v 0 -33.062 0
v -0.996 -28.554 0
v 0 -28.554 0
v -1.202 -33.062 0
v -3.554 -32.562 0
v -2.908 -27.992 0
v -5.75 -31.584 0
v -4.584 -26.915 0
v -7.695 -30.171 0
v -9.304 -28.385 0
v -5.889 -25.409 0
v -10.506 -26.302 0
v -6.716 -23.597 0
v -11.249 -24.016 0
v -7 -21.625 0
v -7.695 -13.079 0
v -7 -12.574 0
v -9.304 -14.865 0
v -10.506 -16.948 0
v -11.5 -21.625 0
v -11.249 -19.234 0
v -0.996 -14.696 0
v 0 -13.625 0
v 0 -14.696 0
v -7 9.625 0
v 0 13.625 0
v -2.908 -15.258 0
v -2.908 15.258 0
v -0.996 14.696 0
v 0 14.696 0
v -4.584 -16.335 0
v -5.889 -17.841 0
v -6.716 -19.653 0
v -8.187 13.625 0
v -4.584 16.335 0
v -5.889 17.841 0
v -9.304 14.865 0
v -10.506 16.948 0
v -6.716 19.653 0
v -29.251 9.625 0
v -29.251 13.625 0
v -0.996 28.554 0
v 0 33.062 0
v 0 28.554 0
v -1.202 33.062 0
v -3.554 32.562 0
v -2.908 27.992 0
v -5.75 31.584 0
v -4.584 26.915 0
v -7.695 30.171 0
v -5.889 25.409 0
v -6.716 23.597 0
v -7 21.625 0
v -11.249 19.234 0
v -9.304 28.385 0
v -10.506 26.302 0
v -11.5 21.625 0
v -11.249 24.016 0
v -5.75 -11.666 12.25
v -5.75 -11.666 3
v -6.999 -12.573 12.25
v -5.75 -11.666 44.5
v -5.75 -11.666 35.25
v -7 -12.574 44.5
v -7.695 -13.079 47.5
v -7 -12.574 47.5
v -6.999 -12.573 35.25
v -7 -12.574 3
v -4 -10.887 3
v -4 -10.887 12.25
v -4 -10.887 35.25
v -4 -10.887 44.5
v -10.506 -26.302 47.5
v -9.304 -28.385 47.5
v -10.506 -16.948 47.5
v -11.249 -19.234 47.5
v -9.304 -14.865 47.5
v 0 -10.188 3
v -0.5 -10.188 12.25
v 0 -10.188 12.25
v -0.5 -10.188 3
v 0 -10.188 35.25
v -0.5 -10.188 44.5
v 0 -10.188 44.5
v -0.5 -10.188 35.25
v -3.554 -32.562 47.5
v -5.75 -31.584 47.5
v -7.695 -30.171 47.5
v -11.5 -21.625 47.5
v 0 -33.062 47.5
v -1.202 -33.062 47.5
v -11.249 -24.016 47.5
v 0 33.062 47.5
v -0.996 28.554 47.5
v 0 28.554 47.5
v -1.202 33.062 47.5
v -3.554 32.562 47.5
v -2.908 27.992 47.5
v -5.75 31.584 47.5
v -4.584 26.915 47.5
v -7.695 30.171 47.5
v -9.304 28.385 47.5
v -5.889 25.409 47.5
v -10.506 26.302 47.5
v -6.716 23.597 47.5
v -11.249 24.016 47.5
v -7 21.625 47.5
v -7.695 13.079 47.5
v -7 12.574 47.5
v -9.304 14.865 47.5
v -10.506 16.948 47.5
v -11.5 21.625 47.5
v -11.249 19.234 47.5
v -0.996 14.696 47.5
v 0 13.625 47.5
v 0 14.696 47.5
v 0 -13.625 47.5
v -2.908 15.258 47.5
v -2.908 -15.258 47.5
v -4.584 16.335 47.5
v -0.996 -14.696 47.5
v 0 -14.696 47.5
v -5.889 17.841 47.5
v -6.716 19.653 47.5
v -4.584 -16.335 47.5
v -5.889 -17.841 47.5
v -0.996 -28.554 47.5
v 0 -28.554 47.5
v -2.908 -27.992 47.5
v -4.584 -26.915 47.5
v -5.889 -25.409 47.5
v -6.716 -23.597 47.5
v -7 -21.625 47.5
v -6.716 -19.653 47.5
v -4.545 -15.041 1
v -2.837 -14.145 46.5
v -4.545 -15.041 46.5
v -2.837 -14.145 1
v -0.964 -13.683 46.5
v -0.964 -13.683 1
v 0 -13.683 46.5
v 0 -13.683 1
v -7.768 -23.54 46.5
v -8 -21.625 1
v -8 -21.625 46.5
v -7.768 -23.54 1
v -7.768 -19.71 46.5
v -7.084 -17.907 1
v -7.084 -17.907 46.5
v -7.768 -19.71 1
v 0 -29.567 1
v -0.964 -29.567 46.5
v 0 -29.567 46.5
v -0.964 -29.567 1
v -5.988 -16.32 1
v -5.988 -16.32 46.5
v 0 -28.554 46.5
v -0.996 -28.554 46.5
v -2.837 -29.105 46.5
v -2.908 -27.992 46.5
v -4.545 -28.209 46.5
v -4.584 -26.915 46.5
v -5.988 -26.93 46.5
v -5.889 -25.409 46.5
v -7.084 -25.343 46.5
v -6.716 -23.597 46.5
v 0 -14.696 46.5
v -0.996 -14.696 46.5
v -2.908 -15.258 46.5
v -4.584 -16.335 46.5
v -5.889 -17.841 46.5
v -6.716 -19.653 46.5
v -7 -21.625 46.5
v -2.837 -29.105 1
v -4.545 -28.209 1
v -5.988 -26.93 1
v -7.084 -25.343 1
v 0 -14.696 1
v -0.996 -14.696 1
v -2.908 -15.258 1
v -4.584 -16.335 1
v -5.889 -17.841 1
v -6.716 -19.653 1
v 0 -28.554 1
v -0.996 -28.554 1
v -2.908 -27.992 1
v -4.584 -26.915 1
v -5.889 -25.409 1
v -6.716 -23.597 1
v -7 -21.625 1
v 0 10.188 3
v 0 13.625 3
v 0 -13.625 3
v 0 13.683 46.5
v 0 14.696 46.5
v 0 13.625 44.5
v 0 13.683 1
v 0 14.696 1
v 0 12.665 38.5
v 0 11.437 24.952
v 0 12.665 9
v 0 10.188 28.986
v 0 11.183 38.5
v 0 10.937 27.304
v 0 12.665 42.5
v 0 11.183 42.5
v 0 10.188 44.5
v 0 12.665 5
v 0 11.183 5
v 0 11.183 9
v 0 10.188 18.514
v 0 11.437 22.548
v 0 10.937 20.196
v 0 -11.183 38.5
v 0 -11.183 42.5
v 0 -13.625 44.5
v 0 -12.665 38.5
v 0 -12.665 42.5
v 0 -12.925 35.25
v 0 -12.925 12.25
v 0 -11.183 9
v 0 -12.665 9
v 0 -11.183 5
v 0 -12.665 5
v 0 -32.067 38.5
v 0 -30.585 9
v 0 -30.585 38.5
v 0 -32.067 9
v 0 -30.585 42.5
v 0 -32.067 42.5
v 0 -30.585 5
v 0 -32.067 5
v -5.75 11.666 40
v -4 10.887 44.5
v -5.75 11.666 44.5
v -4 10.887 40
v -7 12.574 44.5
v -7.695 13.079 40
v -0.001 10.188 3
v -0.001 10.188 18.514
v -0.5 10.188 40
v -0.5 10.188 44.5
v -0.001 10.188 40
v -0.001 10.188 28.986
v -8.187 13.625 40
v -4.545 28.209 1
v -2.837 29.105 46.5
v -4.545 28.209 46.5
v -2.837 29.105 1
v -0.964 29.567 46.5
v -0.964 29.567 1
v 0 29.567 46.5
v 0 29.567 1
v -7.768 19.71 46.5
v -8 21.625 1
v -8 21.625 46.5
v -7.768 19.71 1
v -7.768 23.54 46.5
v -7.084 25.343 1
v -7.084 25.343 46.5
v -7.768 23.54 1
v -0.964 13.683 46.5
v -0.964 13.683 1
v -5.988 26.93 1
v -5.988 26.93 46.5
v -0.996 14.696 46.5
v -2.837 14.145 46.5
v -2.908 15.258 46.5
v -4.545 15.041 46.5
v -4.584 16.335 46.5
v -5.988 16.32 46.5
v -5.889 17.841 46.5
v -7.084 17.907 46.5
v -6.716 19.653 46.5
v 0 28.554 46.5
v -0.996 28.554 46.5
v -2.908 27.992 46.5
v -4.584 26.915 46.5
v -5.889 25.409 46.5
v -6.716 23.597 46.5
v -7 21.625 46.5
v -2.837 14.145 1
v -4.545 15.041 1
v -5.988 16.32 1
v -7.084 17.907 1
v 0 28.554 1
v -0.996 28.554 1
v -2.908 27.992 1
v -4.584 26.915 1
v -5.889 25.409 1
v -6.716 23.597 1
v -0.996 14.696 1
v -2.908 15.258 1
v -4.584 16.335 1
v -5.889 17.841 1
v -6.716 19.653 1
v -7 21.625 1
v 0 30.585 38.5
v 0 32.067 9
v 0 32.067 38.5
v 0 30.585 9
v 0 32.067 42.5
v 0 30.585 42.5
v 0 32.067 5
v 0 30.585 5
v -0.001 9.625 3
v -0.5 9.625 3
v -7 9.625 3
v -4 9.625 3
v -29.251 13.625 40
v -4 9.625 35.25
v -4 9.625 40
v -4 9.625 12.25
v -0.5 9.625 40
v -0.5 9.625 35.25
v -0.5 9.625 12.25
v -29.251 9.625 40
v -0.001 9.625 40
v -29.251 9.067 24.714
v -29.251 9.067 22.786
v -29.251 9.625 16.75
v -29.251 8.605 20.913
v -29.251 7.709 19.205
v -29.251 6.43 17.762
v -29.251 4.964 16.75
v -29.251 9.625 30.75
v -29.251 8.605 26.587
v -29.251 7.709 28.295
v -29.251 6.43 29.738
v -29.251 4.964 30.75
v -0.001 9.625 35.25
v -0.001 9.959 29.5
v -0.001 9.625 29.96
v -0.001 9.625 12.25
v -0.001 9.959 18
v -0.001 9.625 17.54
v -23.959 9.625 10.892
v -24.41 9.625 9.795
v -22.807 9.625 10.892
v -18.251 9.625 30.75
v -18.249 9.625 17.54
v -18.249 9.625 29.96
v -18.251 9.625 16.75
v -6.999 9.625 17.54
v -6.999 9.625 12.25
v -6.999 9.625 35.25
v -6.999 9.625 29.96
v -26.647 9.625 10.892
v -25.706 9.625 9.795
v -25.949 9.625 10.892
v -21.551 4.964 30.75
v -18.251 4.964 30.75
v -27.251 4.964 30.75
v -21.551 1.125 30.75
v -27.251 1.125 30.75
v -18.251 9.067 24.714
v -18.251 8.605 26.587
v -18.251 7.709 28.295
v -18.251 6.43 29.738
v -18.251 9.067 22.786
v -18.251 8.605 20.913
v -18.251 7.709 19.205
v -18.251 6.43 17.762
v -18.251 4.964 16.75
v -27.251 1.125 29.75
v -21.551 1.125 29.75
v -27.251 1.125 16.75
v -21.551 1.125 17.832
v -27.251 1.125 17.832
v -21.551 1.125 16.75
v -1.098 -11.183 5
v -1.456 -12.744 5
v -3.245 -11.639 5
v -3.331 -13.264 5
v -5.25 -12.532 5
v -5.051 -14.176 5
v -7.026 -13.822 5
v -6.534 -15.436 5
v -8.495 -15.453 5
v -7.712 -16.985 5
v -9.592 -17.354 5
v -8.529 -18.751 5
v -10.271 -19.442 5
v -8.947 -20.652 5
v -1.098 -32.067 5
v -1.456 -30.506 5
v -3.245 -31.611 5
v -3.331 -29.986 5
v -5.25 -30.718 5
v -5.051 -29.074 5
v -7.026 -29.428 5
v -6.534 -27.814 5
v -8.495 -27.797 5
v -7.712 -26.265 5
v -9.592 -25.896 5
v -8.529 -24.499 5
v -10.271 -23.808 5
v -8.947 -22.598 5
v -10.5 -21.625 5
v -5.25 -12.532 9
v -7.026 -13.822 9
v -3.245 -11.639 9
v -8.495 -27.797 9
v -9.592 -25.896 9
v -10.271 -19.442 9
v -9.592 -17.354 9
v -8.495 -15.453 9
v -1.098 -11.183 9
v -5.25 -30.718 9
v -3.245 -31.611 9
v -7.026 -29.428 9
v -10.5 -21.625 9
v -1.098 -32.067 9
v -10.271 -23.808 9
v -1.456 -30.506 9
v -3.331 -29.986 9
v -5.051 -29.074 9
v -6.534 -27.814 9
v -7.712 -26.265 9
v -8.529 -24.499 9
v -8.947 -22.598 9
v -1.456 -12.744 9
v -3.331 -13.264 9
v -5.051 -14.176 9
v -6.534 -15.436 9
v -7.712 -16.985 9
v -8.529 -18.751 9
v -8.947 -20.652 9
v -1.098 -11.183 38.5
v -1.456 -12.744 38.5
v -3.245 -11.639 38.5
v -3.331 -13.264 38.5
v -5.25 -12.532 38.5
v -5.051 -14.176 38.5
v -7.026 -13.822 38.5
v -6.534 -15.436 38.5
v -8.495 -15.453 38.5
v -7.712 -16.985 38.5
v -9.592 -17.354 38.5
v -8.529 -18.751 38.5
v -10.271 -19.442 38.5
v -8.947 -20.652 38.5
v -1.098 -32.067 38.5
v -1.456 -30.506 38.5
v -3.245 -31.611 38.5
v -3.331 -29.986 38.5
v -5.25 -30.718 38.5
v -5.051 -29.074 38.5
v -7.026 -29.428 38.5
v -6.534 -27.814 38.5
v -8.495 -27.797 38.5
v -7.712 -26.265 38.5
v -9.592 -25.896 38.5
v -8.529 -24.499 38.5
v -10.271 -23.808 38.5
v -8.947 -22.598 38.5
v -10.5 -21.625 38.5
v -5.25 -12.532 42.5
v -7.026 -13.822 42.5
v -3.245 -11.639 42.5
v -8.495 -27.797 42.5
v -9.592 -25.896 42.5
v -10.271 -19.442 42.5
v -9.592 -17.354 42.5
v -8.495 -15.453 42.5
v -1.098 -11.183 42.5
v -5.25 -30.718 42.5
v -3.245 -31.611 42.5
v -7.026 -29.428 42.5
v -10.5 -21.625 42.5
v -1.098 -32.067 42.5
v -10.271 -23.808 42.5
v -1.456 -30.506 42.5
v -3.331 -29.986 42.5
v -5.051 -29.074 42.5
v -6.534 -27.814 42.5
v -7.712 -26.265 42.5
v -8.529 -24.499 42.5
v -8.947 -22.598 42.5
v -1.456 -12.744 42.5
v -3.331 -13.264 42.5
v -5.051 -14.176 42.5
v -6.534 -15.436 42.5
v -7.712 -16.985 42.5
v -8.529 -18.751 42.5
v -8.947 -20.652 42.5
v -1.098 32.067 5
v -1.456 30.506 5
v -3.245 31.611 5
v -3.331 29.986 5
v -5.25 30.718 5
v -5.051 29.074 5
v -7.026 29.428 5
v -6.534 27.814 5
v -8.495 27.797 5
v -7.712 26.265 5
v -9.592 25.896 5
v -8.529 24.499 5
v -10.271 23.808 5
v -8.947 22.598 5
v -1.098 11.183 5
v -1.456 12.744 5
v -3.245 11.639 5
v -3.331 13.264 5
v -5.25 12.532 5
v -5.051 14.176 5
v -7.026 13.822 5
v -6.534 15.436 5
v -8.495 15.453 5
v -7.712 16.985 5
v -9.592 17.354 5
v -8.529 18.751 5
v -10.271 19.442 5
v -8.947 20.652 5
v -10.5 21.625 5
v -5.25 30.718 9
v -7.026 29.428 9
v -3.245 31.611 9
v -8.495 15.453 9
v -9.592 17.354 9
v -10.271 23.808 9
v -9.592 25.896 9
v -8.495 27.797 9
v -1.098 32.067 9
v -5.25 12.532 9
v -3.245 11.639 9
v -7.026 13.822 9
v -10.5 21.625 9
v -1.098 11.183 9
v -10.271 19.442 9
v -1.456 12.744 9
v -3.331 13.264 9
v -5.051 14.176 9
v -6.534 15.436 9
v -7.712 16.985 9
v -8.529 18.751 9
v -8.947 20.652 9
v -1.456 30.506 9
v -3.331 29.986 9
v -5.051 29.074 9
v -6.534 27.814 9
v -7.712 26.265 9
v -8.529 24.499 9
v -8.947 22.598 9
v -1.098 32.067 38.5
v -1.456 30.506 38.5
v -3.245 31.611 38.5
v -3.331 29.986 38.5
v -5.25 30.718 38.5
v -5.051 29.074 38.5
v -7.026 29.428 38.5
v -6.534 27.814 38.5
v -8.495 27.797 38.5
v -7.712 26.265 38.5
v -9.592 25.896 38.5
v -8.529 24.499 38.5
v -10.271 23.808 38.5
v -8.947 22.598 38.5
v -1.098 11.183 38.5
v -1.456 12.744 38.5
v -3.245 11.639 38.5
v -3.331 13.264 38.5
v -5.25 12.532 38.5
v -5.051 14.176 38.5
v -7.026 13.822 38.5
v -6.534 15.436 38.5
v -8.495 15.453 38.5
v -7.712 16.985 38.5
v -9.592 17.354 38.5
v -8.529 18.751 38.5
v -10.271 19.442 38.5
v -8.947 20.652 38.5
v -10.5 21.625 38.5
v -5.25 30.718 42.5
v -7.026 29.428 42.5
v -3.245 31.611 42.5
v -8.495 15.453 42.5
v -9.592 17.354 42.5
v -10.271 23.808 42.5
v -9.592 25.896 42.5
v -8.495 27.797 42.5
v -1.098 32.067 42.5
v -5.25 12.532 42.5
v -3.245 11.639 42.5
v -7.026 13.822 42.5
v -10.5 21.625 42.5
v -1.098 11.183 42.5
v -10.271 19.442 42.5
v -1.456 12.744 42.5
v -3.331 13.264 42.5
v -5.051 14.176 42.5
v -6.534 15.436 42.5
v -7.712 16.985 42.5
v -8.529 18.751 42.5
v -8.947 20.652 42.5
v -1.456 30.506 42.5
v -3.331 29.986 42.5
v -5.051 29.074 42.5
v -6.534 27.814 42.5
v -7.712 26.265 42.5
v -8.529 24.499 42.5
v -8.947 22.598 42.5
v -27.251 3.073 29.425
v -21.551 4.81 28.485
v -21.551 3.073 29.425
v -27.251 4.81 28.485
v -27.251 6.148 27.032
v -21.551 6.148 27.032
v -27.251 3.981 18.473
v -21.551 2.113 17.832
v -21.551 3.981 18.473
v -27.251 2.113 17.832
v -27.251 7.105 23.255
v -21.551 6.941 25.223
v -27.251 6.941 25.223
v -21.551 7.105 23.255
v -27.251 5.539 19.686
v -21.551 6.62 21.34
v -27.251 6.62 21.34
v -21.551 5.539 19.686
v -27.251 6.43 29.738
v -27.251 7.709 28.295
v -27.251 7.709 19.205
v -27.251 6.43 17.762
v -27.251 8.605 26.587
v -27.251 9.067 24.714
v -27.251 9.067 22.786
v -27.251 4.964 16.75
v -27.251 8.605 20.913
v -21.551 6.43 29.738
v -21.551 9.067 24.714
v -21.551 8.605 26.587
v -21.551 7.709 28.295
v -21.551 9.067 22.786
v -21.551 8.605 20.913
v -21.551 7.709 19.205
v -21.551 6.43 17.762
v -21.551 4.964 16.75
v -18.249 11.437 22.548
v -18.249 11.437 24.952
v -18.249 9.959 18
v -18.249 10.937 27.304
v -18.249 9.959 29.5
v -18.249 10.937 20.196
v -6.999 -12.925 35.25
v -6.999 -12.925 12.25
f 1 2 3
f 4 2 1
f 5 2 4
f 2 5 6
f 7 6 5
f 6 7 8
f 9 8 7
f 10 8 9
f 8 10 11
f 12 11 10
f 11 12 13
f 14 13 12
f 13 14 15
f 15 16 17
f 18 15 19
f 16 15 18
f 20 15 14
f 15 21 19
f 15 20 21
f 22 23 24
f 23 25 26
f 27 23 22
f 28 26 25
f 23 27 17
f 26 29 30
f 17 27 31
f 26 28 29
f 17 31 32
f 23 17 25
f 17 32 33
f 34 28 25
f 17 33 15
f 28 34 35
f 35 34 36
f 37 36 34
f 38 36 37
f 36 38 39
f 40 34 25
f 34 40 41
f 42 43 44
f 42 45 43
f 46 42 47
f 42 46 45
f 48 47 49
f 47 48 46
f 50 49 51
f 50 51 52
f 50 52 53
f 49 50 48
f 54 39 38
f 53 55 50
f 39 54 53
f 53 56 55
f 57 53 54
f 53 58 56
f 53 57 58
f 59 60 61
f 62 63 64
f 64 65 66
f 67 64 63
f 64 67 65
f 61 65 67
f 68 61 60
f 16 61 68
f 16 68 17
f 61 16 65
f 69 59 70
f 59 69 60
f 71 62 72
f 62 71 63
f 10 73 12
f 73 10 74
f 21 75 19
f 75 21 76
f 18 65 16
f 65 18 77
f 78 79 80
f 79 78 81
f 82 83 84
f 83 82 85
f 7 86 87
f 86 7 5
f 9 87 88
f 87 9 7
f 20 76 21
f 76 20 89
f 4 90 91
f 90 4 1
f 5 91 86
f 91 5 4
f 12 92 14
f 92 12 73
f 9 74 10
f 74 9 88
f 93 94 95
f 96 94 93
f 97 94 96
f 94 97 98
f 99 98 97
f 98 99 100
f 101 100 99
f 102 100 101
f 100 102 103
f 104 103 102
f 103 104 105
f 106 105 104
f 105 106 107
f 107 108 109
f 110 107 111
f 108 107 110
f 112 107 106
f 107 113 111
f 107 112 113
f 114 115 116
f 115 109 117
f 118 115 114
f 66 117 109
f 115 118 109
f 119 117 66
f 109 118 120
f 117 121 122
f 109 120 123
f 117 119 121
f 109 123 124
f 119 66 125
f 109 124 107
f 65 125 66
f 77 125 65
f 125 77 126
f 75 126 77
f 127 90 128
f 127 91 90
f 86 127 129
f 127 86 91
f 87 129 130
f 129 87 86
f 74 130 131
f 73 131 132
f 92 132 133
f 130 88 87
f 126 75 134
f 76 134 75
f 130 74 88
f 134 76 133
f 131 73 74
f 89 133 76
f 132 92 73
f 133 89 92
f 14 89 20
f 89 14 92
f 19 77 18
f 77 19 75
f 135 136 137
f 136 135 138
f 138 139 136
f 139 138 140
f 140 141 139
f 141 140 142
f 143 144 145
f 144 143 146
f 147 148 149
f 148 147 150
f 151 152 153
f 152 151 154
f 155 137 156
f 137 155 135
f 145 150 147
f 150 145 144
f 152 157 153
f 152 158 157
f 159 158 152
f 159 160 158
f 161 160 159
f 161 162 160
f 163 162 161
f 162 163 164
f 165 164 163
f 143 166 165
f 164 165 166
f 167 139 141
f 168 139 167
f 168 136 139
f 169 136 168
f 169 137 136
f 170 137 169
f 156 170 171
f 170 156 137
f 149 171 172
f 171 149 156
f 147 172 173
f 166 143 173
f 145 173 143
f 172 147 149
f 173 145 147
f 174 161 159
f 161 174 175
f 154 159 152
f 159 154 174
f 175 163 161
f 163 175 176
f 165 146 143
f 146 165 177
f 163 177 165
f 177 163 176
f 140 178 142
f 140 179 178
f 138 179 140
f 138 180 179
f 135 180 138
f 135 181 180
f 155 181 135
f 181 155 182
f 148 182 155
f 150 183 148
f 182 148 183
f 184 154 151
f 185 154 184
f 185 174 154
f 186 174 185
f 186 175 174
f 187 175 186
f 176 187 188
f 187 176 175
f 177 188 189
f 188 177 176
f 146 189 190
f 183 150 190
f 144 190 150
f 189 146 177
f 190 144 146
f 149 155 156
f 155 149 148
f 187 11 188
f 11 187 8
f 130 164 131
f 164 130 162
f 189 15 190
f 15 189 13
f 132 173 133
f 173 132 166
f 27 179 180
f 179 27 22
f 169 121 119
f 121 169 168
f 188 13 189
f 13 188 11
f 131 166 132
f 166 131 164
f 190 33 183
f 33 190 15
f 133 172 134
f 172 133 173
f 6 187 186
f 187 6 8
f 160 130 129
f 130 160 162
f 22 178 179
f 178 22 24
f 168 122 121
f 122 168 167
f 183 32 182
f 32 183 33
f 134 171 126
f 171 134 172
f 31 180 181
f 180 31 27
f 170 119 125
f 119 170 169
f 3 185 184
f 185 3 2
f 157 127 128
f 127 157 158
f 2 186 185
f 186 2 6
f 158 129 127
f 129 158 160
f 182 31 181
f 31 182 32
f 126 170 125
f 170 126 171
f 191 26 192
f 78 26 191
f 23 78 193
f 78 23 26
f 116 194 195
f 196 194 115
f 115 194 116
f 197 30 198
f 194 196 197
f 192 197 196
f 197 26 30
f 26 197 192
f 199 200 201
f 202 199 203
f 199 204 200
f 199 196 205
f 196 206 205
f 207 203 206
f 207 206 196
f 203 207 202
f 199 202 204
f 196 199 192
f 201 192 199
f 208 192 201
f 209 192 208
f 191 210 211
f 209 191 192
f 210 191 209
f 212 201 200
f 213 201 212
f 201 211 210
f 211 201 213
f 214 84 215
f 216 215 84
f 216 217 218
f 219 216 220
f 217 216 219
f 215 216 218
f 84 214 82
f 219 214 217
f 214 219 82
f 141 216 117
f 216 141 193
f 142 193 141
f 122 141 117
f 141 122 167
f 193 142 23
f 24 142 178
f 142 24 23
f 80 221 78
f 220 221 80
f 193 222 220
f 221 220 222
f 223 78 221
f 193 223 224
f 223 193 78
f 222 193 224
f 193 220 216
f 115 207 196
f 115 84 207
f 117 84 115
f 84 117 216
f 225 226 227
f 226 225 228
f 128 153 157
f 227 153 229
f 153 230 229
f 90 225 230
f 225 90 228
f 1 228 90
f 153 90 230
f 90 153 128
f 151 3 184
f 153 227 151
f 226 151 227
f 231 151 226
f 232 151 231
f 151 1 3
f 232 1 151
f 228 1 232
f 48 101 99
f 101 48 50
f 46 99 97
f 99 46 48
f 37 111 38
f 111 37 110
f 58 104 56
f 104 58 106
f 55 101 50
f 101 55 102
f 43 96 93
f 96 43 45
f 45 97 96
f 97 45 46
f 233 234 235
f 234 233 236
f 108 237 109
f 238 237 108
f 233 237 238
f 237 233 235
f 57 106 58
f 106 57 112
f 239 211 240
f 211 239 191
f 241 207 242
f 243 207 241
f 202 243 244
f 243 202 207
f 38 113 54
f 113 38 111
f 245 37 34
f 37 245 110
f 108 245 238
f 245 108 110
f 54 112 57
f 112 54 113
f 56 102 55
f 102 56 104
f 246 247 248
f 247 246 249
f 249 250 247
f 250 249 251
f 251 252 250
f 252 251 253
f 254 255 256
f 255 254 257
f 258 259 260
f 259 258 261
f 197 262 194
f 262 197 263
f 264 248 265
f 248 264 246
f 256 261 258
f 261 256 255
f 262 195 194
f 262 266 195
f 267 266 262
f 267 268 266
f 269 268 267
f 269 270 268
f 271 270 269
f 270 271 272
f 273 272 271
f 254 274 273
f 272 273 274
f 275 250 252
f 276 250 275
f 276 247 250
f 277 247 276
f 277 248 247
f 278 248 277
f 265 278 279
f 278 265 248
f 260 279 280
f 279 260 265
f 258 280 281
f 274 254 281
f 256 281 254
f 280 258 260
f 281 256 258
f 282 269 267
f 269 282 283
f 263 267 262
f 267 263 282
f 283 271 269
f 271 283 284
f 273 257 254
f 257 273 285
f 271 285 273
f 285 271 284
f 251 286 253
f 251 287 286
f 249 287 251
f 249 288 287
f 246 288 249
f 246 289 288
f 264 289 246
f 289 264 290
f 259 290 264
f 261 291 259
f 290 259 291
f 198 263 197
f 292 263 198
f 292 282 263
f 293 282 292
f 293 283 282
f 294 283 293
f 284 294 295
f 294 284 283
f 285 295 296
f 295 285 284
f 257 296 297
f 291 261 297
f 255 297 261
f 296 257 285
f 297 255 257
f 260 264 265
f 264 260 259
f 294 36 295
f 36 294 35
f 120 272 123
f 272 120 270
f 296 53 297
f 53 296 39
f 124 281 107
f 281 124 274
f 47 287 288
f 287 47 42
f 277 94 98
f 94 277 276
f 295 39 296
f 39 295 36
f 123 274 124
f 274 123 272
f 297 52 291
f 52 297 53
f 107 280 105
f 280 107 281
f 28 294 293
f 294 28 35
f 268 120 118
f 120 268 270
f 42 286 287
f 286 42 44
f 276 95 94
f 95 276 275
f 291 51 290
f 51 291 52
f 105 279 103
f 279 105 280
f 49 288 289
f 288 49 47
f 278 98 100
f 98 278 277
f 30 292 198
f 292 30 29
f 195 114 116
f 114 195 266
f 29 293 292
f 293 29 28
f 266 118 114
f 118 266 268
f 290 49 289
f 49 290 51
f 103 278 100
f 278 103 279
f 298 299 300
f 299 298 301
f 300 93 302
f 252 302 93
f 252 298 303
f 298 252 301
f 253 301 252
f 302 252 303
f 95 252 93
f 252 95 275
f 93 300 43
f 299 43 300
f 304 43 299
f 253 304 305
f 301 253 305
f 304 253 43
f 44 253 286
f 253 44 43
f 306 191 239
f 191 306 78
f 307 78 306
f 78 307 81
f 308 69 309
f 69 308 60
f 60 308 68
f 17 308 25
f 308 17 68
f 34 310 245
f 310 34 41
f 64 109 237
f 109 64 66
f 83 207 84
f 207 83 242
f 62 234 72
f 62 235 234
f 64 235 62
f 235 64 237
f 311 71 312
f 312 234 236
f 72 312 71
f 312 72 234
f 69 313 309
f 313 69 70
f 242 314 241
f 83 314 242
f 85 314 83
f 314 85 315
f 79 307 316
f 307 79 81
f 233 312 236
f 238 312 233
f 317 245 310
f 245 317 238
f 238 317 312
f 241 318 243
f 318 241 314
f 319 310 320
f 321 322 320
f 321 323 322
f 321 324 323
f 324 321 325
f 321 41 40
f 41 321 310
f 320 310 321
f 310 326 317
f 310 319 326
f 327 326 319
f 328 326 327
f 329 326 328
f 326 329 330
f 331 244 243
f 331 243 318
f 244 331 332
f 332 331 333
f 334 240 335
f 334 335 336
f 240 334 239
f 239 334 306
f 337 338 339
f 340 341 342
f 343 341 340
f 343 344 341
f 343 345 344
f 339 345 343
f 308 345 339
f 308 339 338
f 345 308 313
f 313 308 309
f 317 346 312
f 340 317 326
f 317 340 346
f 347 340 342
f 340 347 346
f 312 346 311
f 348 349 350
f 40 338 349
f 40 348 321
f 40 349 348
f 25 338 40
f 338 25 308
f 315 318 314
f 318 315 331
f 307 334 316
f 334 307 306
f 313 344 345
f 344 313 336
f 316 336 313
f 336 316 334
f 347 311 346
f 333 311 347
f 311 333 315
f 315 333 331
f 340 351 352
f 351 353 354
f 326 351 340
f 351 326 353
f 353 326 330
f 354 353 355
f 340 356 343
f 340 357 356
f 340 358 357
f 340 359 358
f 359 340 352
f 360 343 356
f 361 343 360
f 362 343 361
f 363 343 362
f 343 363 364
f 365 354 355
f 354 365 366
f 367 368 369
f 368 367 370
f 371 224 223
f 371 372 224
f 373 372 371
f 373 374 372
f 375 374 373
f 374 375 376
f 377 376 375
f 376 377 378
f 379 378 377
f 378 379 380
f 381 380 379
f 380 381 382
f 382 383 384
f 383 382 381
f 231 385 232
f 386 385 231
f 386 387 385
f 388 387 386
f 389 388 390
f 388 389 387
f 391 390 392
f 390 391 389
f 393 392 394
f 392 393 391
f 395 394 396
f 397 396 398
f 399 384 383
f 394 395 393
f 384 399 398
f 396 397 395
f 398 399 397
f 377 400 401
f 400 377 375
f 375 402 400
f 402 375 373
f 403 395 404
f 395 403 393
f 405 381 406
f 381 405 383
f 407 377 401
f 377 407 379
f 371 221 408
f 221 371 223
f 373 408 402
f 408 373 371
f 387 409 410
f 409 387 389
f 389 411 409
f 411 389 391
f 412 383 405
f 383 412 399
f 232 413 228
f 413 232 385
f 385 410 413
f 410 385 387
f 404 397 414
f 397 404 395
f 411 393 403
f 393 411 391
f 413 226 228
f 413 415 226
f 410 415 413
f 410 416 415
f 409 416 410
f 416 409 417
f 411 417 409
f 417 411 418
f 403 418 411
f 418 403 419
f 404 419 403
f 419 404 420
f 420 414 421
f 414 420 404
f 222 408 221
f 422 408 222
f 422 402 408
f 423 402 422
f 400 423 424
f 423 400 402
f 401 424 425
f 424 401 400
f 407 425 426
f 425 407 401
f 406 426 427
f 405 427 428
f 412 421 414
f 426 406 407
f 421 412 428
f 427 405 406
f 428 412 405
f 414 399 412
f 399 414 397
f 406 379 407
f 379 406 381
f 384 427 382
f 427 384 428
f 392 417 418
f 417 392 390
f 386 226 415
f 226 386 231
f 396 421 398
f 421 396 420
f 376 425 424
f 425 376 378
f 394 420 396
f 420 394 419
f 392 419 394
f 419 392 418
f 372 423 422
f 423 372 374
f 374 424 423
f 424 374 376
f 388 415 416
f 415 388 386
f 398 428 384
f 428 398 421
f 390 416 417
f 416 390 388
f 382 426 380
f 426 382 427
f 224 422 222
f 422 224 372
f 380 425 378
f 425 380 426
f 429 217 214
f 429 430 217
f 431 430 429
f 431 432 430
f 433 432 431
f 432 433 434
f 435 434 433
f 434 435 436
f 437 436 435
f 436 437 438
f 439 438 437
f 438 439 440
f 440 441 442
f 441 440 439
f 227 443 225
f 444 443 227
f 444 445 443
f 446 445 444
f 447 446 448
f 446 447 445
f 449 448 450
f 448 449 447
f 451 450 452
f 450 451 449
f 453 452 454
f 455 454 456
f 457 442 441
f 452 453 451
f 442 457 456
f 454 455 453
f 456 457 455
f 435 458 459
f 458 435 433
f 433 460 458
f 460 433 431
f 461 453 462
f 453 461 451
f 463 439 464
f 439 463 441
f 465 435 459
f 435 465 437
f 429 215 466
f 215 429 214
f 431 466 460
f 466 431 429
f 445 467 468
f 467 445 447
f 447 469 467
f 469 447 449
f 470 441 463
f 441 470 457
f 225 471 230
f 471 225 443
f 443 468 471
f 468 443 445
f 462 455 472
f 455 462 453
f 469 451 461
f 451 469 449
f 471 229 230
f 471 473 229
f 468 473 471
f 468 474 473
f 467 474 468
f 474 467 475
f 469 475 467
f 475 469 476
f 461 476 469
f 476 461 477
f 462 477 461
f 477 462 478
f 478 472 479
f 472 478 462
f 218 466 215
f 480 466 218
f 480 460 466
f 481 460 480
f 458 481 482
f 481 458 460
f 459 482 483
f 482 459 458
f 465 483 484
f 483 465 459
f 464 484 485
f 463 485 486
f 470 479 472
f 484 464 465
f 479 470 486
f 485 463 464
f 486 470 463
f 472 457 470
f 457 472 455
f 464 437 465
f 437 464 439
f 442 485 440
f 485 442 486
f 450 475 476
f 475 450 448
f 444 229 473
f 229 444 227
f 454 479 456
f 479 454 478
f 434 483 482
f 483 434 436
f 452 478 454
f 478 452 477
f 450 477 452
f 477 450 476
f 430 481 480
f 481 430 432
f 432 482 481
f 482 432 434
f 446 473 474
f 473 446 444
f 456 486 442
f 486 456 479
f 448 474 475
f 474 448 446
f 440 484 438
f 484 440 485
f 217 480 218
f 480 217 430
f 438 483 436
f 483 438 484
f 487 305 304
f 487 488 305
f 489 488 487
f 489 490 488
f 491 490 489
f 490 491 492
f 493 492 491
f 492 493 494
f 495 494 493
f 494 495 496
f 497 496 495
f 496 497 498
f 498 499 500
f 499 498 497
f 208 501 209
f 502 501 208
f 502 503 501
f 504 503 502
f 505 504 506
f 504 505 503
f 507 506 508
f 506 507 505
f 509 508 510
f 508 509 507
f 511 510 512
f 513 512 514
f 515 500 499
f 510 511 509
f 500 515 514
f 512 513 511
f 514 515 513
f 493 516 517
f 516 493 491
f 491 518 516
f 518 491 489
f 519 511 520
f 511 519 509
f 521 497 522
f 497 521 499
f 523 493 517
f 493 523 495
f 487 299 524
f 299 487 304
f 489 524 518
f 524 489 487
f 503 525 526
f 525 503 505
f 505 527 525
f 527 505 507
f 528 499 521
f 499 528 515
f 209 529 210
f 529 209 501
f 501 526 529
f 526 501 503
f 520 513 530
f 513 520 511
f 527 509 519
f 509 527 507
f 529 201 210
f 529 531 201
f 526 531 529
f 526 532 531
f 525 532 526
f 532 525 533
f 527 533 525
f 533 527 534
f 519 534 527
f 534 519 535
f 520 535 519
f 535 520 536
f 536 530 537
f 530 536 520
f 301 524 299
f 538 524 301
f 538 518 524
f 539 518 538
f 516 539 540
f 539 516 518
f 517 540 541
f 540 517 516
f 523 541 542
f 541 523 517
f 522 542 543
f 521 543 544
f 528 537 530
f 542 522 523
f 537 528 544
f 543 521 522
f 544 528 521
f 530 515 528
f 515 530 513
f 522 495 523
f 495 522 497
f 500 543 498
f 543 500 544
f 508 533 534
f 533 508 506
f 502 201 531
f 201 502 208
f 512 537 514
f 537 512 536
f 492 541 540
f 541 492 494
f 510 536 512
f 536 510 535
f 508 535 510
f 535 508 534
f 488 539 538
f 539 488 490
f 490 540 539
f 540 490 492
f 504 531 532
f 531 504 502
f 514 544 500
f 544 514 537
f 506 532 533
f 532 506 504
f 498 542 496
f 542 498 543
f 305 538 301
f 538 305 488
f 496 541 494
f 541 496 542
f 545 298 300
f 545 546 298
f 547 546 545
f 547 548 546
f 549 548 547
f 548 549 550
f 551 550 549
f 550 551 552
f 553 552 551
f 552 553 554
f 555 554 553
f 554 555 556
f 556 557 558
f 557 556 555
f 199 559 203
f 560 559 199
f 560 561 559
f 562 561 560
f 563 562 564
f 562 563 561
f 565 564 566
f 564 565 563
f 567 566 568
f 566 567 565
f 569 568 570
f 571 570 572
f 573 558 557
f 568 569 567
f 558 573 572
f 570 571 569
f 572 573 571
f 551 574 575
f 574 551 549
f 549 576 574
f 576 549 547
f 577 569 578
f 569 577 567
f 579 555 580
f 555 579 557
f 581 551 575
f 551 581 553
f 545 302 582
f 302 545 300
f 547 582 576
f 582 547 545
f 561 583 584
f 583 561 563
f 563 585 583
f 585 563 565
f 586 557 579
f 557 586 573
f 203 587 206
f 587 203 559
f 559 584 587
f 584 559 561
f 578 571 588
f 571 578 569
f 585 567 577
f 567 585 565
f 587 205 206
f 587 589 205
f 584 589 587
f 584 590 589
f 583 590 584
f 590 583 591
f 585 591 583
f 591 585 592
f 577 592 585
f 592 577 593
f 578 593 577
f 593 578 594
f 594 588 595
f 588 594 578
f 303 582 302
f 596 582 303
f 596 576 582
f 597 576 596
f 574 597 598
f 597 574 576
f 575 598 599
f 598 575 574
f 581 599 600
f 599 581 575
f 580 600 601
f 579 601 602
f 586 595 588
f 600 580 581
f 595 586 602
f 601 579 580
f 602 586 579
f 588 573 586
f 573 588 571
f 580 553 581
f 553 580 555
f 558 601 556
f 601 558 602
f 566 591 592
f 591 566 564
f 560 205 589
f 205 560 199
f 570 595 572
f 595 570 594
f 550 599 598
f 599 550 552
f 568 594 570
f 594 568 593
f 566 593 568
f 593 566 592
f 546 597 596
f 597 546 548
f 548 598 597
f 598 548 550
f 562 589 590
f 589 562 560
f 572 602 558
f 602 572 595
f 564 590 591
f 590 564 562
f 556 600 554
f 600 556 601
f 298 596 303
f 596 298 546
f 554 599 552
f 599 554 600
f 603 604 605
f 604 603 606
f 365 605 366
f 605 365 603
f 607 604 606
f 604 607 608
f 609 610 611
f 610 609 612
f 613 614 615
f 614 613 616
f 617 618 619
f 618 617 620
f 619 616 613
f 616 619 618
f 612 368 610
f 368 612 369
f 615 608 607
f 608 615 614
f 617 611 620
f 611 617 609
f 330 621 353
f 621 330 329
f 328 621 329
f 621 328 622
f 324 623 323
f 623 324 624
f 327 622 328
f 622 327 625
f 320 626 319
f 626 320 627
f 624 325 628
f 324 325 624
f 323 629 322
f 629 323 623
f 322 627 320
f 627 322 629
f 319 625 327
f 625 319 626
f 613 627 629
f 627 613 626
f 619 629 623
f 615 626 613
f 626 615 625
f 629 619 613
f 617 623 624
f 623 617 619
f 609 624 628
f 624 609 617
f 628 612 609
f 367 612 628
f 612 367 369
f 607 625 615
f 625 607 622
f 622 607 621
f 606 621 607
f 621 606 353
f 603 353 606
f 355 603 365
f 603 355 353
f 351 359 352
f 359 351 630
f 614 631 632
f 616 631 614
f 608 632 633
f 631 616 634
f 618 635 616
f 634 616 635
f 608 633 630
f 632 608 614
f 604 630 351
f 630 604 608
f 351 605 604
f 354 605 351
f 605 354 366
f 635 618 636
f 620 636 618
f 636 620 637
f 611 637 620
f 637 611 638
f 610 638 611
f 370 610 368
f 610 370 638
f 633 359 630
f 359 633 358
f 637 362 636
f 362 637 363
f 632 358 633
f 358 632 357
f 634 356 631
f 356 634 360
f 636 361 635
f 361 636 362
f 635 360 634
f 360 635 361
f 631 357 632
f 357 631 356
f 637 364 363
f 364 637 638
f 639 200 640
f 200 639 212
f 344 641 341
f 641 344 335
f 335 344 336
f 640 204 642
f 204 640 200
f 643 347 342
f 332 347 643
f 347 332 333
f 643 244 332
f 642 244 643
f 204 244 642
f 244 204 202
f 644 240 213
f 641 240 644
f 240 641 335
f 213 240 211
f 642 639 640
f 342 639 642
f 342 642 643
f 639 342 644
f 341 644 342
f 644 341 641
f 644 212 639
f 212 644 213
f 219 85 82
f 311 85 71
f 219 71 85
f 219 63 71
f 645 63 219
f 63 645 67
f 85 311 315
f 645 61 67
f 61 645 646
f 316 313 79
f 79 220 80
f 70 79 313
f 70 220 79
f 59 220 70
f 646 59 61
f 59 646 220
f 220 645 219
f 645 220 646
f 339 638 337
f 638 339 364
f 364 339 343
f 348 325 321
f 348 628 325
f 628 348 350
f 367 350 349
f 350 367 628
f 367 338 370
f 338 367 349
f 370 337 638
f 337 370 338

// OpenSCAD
// FuseBox X-Carriage design

rod_spacing = 43.25 ;
carriage_length = 47.5 ;

cowling_diameter = 23 ;
bearing_diameter = 16 ;

// Height of the hotend holder above the bottom of the carriage
hotend_tower_height = 29.25 ;
hotend_tower_width = 40 ;
hotend_tower_thickness = 4 ;
hotend_grip_height = 11 ;
hotend_grip_thickness = 9 ;
hotend_grip_width = 14 ;

groove_collar_offset = 2 ; // Distance from top of tower to groove-collar
groove_collar_height = 5.7;
groove_collar_diameter = 12 ;
groove_diameter = 16 ;
e3d_cooling_diameter = 23 ; // 22.3 actual
e3d_cooling_height = 30 ;

// Lateral carriage struts
strut_width = 3 ;
strut_height = 7 ;
strut_plate_height = 3.5 ;

// Modules
module bearing_holder(l=carriage_length, id=bearing_diameter, od=cowling_diameter, fd=-1) {
    rfd = (fd<0) ? id-2 : fd ;
    difference() {
        // Outer body
        cylinder(l,r=od/2);
        // Bearing
        translate([0,0,1]) cylinder(l-2,r=id/2);
        // Flange
        translate([0,0,-1]) cylinder(l+2,r=rfd/2);

        // Half-cylinder
        translate([0,-od/2,-1]) cube([od/2,od,l+2]);
    }
}

module zip_tie_ring(l=4, id=-1, od=21) {
    rid = (id<0) ? od-3 : id ;
    difference() {
        // Ring channel
        cylinder(l,r=od/2);
        // Inner limit
        translate([0,0,-1]) cylinder(l+2,r=rid/2);
    }
}

module lm8zz_long_2() {
    difference() {
        bearing_holder();
        translate([0,0,5]) zip_tie_ring();
        translate([0,0,38.5]) zip_tie_ring();
    }
}

module x_carriage_solid() {
    union() {
        translate([0,-rod_spacing/2,0]) bearing_holder() ;
        translate([0,rod_spacing/2,0]) bearing_holder() ;
    }
}
module x_carriage_gaps() {
    union() {
        translate([0,-rod_spacing/2,0]) {
            translate([0,0,5]) zip_tie_ring();
            translate([0,0,38.5]) zip_tie_ring();
        }
        translate([0,rod_spacing/2,0]) {
            translate([0,0,5]) zip_tie_ring();
            translate([0,0,38.5]) zip_tie_ring();
        }
    }
}

hotend_tower_pos = [0,rod_spacing/2-bearing_diameter/2-hotend_tower_thickness, 0.001 ] ;
hotend_grip_pos = [
        carriage_length/2-hotend_grip_width/2,
        -hotend_tower_thickness-hotend_grip_thickness/2,
        hotend_tower_height - hotend_grip_height] ;


module hotend_tower() {
    // Hot-end mount platform
    translate(hotend_tower_pos)
        cube([hotend_tower_width,hotend_tower_thickness,hotend_tower_height]);
}

module hotend_grip() {
    // Hot-end neck grip (e3d)
    translate(hotend_tower_pos)
      translate(hotend_grip_pos)
        cube([hotend_grip_width,hotend_grip_thickness+0.1,hotend_grip_height]);
}

module hotend_mount() {
    union() {
        hotend_tower();
        hotend_grip();
    }
}

module hotend_mount_gaps() {
    // Carve out space for the e3d hotend
    // Hot-end neck grip (e3d)
        translate(hotend_tower_pos)
            translate(hotend_grip_pos) {
                translate([hotend_grip_width/2,0,-0.5])
                    cylinder(h=hotend_grip_height+1, r=groove_collar_diameter/2);
                translate([hotend_grip_width/2,0,hotend_grip_height-groove_collar_offset])
                    cylinder(h=groove_collar_offset+0.1, r=groove_diameter/2);
                translate([hotend_grip_width/2,0,-0.5])
                    cylinder(h=hotend_grip_height-groove_collar_offset-groove_collar_height+0.5, r=groove_diameter/2);
            }
        translate([carriage_length/2,0,hotend_tower_height-hotend_grip_height-e3d_cooling_height-0.001])
            cylinder(h=e3d_cooling_height, r=e3d_cooling_diameter/2);
}

module hotend_mount_overhang() {
    difference() {
        hotend_grip();
        hotend_mount_gaps();
    }
}

module hotend_mount_support() {
    translate([-hotend_grip_width/2,hotend_grip_height,0])
        rotate([0,-90,0])
            translate(hotend_tower_pos)
                translate(hotend_grip_pos)
                    rotate([0,90,0])
        mirror([0,0,1])
            linear_extrude(height=hotend_grip_thickness, scale=0)
                translate([hotend_grip_width/2,-hotend_grip_height,0])
                    projection()
                        rotate([0,-90,0])
                            translate(-hotend_tower_pos)
                                translate(-hotend_grip_pos)
                                    hotend_mount_overhang();
}

strut_len = rod_spacing-bearing_diameter ;
module x_carriage_struts() {
    translate([0,-strut_len/2, 0]) cube([strut_width, strut_len ,strut_height]);
    translate([carriage_length-strut_width,-strut_len/2, 0]) cube([strut_width, strut_len ,strut_height]);
    translate([0,-strut_len/2,0.5]) cube([carriage_length, strut_len , strut_plate_height]);
}

module x_carriage_struts_gaps() {
    len = strut_len - hotend_tower_thickness - 0.7;
    translate([(carriage_length-e3d_cooling_diameter)/2,-rod_spacing/2+bearing_diameter/2+0.7,-0.001])
        cube([e3d_cooling_diameter, len , strut_height]);
}

rotate([0,-90,0])
    difference() {
        union() {
            rotate([0,90,0])
                x_carriage_solid();
            x_carriage_struts();
            hotend_mount();
        }
        rotate([0,90,0])
            x_carriage_gaps();
        x_carriage_struts_gaps();
        hotend_mount_gaps();
    }

hotend_mount_support();
